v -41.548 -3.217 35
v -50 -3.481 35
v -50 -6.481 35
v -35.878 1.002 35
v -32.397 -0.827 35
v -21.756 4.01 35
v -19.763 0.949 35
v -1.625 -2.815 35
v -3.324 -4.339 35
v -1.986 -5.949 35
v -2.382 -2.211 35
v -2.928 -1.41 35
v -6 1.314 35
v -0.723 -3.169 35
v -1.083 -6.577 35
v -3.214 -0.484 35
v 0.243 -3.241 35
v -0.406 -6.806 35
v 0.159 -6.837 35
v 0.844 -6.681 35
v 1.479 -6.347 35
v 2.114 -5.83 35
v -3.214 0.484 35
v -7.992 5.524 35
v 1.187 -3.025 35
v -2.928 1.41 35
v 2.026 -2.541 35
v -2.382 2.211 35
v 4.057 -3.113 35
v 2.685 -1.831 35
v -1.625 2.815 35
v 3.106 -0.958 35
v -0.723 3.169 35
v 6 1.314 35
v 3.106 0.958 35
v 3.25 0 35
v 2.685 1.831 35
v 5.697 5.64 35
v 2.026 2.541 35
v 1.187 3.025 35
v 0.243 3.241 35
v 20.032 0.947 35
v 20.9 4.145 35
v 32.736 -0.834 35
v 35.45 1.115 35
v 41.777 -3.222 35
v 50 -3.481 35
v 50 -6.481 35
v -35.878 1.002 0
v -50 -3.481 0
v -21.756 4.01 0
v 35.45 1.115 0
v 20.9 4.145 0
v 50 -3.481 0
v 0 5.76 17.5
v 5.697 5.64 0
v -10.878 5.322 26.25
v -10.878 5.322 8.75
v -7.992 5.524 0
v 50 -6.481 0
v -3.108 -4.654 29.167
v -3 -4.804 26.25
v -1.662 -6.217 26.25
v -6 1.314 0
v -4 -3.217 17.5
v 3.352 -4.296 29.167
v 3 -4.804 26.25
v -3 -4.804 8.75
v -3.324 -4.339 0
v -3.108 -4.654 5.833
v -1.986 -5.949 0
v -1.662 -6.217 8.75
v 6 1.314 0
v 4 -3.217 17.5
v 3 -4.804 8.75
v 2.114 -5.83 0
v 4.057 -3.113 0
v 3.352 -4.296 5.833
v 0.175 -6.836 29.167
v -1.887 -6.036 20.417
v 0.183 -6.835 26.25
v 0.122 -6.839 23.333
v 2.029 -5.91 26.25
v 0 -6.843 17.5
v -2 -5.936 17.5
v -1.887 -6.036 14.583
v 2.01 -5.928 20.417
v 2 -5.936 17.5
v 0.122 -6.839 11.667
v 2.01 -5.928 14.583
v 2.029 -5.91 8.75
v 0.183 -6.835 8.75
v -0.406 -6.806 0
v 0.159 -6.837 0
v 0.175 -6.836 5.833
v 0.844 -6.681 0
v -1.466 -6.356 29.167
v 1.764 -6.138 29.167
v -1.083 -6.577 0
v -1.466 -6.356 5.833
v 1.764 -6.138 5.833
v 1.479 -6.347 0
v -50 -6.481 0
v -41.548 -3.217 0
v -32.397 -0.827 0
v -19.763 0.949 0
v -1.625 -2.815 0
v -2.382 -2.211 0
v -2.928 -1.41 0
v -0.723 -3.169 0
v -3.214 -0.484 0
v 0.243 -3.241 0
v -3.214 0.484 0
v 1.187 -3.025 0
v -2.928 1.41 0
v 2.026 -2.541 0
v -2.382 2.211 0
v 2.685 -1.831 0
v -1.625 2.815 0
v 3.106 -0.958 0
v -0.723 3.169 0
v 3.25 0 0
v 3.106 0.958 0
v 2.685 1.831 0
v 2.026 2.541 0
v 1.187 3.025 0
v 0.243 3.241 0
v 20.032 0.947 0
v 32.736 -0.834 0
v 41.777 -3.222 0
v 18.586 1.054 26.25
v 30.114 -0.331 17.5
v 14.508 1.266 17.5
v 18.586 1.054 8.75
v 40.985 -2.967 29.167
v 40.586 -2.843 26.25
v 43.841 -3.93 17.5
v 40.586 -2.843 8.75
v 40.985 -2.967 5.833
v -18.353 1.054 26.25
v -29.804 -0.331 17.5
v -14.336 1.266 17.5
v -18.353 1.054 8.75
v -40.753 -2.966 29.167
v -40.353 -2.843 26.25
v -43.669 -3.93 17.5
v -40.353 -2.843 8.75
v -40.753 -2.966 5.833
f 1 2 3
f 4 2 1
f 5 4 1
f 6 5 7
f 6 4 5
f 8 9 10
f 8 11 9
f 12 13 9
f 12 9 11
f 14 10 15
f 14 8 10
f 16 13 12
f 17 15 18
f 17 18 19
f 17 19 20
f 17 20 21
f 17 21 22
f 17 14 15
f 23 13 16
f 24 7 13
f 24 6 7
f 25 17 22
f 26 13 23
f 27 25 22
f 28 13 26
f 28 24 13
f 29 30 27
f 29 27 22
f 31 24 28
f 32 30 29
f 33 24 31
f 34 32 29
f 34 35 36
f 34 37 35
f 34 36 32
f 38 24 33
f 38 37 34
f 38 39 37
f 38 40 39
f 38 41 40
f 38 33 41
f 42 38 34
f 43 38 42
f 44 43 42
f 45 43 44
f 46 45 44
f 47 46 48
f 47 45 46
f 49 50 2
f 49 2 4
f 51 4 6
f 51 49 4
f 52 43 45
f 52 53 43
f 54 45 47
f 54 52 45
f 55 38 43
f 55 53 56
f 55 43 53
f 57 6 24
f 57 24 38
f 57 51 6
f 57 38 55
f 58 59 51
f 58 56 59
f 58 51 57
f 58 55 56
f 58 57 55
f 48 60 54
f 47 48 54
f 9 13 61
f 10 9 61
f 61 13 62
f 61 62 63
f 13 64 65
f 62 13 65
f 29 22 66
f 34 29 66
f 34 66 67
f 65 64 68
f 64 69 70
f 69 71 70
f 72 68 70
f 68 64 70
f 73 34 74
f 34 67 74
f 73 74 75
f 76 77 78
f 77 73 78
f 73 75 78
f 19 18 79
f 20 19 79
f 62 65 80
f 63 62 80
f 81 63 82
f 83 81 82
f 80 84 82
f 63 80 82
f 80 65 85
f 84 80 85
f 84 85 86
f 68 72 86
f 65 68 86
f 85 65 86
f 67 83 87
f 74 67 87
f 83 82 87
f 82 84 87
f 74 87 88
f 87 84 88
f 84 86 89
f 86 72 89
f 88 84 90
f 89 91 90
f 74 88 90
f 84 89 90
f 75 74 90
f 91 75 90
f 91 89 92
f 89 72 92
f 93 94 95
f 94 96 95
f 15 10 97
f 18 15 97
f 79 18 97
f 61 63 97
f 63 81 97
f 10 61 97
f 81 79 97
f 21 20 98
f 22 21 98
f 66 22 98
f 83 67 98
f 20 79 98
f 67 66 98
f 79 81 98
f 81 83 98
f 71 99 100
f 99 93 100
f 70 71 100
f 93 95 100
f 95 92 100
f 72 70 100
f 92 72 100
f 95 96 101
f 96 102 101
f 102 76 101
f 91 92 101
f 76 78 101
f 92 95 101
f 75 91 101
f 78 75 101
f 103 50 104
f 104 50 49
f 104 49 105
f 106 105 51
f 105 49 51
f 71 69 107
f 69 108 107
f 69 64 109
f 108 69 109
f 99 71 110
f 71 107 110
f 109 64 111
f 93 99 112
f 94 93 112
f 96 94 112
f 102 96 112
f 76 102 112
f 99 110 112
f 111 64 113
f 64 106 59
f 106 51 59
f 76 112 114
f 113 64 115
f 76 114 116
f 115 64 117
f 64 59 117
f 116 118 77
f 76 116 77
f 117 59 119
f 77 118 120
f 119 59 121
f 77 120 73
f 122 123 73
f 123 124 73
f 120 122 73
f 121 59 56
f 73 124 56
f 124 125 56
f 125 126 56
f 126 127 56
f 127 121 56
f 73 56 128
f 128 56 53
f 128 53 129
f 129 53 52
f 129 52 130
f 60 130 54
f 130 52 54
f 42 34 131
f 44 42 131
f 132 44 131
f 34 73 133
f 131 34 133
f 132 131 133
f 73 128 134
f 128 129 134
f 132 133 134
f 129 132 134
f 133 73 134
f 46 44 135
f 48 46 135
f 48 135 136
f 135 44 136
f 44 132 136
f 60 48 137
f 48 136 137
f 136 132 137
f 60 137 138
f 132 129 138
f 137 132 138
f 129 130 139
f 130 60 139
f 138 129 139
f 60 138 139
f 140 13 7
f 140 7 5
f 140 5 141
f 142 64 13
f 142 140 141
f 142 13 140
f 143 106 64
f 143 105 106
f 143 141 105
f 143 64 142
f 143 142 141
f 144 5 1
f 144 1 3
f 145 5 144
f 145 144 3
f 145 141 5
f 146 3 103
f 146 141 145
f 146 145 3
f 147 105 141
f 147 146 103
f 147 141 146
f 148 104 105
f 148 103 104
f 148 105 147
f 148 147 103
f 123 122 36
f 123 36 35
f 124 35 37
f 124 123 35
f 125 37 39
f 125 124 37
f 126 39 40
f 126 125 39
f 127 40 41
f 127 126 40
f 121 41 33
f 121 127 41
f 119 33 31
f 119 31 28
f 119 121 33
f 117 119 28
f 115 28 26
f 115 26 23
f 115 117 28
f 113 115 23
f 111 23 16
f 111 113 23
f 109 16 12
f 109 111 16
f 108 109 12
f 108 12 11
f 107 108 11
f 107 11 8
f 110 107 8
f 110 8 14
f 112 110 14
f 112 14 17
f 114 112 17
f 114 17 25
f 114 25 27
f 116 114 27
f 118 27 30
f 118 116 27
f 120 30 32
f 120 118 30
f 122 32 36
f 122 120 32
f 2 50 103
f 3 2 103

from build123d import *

# Parameters (mm, degrees)
SKETCH_1_R      = 3.25
EXTRUDE_1_DEPTH = 35


with BuildPart() as part:
    # 草圖1 → 填料-伸長1 (new body)
    with BuildSketch(Plane.XY):
        with BuildLine():
            Line((-50, -3.480646824), (-50, -6.480646824))
            add(Edge.make_bspline(
                [(-6, 1.314323068), (-31.607950909, 1.920554197), (-50, -6.480646824)],
                knots=[0, 0, 0, 1, 1, 1], degree=2))
            add(Edge.make_bspline(
                [(-6, 1.314323068), (0, -15), (6, 1.314323068)],
                knots=[0, 0, 0, 1, 1, 1], degree=2))
            add(Edge.make_bspline(
                [(6, 1.314323068), (32.228671013, 1.920554197), (50, -6.480646824)],
                knots=[0, 0, 0, 1, 1, 1], degree=2))
            Line((50, -6.480646824), (50, -3.480646824))
            add(Edge.make_bspline(
                [(-50, -3.480646824), (0, 15), (50, -3.480646824)],
                knots=[0, 0, 0, 1, 1, 1], degree=2))
        make_face()
        Circle(SKETCH_1_R, mode=Mode.SUBTRACT)
    extrude(amount=EXTRUDE_1_DEPTH)


solid = part.part
